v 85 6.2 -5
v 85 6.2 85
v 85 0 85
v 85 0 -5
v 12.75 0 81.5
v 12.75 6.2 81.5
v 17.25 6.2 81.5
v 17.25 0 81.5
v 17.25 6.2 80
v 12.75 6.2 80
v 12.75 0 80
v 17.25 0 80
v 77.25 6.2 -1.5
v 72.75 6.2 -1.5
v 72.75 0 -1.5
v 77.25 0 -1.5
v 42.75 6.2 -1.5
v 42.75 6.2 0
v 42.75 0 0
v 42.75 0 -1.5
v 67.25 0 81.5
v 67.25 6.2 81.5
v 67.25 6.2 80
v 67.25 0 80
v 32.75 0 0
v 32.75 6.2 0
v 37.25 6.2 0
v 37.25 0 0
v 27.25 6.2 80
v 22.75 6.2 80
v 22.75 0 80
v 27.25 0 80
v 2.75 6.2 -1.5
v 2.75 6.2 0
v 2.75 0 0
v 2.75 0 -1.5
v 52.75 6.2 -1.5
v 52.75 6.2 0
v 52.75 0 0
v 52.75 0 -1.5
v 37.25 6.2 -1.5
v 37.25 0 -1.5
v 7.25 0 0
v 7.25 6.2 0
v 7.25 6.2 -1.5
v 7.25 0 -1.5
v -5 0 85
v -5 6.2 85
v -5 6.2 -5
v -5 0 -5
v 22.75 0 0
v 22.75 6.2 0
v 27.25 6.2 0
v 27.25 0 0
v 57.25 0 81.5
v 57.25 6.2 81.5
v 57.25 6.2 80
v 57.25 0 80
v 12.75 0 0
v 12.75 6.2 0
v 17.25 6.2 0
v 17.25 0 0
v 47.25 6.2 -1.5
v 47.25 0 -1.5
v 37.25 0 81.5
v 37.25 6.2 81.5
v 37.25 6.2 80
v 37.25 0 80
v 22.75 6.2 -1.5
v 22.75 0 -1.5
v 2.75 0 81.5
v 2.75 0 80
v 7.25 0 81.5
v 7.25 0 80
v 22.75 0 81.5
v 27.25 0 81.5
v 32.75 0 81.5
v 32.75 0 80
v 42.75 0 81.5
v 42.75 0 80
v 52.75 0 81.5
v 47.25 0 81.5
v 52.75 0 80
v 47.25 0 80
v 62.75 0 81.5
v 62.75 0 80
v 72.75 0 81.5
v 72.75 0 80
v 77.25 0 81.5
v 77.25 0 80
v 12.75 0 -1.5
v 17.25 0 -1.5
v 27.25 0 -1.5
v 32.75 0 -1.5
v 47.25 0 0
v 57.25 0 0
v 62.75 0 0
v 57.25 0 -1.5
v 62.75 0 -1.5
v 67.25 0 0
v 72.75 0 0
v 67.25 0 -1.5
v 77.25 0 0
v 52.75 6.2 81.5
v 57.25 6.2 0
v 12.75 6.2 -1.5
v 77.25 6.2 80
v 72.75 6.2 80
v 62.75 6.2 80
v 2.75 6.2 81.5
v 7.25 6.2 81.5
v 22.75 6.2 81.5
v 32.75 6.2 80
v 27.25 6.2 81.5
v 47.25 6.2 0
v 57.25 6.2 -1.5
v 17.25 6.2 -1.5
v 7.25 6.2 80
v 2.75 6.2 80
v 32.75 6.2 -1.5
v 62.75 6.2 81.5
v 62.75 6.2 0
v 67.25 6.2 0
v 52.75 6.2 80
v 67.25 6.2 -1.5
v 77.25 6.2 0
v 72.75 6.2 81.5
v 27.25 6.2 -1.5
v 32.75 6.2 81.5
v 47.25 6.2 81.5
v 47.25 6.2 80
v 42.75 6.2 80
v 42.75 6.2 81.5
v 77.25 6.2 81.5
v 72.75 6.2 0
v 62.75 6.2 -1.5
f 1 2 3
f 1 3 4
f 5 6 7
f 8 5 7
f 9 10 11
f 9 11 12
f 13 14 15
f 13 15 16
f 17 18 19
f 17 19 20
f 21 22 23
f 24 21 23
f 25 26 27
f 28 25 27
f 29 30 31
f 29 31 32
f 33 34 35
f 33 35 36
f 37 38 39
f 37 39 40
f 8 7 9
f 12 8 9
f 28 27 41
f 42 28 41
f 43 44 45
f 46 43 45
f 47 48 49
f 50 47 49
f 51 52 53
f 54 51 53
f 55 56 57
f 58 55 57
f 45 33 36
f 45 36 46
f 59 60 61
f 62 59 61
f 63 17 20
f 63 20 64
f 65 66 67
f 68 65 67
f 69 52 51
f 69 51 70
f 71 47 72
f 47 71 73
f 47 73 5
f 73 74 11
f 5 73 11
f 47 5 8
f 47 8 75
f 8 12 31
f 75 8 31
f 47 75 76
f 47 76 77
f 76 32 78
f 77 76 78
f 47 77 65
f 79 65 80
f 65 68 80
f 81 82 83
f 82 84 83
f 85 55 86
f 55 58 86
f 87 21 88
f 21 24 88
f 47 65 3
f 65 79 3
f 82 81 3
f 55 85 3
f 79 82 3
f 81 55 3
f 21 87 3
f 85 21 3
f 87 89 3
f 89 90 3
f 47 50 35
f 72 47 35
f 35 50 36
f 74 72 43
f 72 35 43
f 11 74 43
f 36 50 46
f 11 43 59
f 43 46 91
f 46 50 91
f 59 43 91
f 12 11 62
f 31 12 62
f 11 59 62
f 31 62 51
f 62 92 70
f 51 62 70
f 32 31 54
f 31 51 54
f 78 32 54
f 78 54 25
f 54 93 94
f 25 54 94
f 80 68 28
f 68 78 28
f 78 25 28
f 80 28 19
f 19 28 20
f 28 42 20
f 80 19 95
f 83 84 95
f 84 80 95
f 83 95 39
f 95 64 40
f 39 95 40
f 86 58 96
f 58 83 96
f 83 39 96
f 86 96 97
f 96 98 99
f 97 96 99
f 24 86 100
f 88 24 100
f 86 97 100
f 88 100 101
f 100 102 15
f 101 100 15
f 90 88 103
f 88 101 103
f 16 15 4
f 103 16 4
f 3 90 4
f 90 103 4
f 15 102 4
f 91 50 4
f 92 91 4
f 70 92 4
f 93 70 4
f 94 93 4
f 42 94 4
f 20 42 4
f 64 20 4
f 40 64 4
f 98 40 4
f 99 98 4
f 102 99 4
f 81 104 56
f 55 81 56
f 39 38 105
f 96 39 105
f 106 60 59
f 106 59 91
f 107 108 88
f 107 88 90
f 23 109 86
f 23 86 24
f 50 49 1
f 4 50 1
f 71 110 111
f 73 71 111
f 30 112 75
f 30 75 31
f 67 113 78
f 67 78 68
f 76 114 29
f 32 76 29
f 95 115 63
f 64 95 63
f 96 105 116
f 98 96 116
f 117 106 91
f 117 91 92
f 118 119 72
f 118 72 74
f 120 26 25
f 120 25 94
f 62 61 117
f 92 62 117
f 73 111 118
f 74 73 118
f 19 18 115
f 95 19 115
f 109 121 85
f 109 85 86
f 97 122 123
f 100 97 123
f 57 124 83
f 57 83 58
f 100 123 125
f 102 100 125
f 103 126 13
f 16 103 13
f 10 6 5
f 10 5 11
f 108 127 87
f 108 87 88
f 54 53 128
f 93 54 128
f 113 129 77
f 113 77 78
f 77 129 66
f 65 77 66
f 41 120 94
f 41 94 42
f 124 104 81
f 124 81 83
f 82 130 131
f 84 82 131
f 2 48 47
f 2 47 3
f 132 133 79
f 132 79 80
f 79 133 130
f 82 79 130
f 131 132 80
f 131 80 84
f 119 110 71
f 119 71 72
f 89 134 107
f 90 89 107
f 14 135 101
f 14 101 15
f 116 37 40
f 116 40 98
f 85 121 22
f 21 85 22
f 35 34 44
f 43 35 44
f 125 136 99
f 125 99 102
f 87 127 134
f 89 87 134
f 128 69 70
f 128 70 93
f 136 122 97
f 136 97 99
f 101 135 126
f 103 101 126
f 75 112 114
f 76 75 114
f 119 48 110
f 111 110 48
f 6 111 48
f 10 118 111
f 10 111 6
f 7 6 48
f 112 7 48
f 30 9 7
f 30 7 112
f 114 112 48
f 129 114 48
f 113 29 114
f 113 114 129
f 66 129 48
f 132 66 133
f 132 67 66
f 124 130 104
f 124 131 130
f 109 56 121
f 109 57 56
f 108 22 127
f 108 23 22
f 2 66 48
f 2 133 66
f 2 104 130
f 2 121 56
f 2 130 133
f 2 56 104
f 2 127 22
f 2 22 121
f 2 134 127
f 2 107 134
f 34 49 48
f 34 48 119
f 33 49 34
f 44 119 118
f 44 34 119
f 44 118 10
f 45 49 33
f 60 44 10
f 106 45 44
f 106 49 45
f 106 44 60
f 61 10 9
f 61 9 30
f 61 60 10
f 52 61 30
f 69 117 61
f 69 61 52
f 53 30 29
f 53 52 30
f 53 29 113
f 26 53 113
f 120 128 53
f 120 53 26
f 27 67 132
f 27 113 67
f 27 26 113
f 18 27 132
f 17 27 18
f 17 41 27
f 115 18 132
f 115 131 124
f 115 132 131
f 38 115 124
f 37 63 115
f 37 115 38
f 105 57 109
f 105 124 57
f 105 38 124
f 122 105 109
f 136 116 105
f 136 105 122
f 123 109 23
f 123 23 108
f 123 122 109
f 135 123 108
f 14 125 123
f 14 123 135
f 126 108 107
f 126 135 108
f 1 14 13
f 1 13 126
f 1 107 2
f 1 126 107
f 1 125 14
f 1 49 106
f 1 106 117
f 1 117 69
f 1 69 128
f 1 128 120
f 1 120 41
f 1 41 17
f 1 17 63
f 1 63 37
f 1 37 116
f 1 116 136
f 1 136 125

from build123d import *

# Parameters (mm, degrees)
OUTLINE_W           = 100
OUTLINE_H           = 100
BOSS_EXTRUDE1_DEPTH = 6.2
SKETCH3_OUTSIDE_W   = 130.312
SKETCH3_OUTSIDE_H   = 130.312
SKETCH3_OUTSIDE_W_2 = 90
SKETCH3_OUTSIDE_H_2 = 90
CUT_EXTRUDE2_DEPTH  = 128.430137723
SKETCH2_W           = 4.5
SKETCH2_H           = 1.5
CUT_EXTRUDE1_DEPTH  = 121.36793593
LPATTERN2_COUNT     = 8
LPATTERN2_PITCH     = 10


with BuildPart() as part:
    # Outline → Boss-Extrude1 (new body)
    with BuildSketch(Plane(origin=(0, 0, 0), x_dir=(1, 0, 0), z_dir=(0, 1, 0))):
        with Locations((40, -40)):
            Rectangle(OUTLINE_W, OUTLINE_H)
    extrude(amount=BOSS_EXTRUDE1_DEPTH)

    # Sketch3 outside → Cut-Extrude2 (cut, through all)
    with BuildSketch(Plane(origin=(0, 6.2, 0), x_dir=(1, 0, 0), z_dir=(0, 1, 0))):
        with Locations((40, -40)):
            Rectangle(SKETCH3_OUTSIDE_W, SKETCH3_OUTSIDE_H)
        with Locations((40, -40)):
            Rectangle(SKETCH3_OUTSIDE_W_2, SKETCH3_OUTSIDE_H_2, mode=Mode.SUBTRACT)
    extrude(amount=-CUT_EXTRUDE2_DEPTH, mode=Mode.SUBTRACT)

    # Sketch2 → Cut-Extrude1 (cut, through all)
    with BuildSketch(Plane(origin=(0, 6.2, 0), x_dir=(1, 0, 0), z_dir=(0, 1, 0))):
        with Locations((5, 0.75)):
            Rectangle(SKETCH2_W, SKETCH2_H)
        with Locations((5, -80.75)):
            Rectangle(SKETCH2_W, SKETCH2_H)
    cut_extrude1 = extrude(amount=-CUT_EXTRUDE1_DEPTH, mode=Mode.SUBTRACT)

    # LPattern2: Cut-Extrude1 ×8
    with Locations(*[(i * LPATTERN2_PITCH, 0, 0) for i in range(1, LPATTERN2_COUNT)]):
        add(cut_extrude1, mode=Mode.SUBTRACT)


solid = part.part
